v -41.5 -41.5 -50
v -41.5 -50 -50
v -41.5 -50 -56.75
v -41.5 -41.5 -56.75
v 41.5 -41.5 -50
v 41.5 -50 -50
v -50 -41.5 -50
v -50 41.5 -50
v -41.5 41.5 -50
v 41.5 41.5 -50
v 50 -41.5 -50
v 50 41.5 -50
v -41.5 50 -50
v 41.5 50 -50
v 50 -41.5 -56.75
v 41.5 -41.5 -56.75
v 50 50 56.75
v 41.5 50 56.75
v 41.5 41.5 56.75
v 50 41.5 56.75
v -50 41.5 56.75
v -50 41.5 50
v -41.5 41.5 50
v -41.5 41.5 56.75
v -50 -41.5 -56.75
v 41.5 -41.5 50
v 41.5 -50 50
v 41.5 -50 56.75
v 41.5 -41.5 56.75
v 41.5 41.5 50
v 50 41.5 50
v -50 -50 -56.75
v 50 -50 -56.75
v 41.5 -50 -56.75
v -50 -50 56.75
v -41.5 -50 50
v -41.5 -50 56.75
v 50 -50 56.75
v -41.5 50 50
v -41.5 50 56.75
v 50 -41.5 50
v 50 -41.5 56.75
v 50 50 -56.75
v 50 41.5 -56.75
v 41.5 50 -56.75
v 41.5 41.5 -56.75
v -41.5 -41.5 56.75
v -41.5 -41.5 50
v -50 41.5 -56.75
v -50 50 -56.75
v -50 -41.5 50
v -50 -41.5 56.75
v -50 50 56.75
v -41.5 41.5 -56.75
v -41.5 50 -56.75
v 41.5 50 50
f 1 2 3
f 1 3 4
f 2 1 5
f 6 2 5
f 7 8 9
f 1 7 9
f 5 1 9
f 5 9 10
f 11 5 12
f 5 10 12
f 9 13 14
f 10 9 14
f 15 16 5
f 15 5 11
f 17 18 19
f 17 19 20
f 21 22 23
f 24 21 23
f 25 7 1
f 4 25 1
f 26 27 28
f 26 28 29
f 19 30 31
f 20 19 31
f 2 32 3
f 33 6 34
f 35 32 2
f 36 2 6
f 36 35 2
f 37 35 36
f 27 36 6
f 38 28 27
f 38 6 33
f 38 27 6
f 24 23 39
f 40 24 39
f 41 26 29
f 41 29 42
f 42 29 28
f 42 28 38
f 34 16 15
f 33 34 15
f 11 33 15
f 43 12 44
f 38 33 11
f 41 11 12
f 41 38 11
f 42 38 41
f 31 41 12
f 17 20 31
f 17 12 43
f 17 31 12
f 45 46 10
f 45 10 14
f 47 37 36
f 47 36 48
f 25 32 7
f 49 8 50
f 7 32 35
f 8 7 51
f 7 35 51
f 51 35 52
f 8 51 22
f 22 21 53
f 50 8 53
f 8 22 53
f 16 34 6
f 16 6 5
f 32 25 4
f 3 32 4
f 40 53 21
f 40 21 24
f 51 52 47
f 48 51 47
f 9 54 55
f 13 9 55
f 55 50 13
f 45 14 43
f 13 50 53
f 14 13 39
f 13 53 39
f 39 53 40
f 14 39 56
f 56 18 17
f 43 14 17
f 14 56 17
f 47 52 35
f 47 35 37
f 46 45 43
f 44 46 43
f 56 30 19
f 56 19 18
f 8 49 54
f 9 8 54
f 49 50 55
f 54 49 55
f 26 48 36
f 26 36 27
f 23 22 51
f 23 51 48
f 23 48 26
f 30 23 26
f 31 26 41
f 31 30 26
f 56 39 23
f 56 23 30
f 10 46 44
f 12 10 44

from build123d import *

# Parameters (mm, degrees)
F0_W     = 100
F0_H     = 100
F1_DEPTH = 50
F2_W     = 8.5
F2_H     = 8.5
F3_DEPTH = 56.75


with BuildPart() as f1:
    # F0 (on Top) → F1 (new body, symmetric)
    with BuildSketch(Plane.XY):
        Rectangle(F0_W, F0_H)
    extrude(amount=F1_DEPTH, both=True)

    # F2 (on Top) → F3 (join, symmetric)
    with BuildSketch(Plane.XY):
        with Locations((-45.75, 45.75)):
            Rectangle(F2_W, F2_H)
        with Locations((45.75, 45.75)):
            Rectangle(F2_W, F2_H)
        with Locations((45.75, -45.75)):
            Rectangle(F2_W, F2_H)
        with Locations((-45.75, -45.75)):
            Rectangle(F2_W, F2_H)
    extrude(amount=F3_DEPTH, both=True)


solid = f1.part
